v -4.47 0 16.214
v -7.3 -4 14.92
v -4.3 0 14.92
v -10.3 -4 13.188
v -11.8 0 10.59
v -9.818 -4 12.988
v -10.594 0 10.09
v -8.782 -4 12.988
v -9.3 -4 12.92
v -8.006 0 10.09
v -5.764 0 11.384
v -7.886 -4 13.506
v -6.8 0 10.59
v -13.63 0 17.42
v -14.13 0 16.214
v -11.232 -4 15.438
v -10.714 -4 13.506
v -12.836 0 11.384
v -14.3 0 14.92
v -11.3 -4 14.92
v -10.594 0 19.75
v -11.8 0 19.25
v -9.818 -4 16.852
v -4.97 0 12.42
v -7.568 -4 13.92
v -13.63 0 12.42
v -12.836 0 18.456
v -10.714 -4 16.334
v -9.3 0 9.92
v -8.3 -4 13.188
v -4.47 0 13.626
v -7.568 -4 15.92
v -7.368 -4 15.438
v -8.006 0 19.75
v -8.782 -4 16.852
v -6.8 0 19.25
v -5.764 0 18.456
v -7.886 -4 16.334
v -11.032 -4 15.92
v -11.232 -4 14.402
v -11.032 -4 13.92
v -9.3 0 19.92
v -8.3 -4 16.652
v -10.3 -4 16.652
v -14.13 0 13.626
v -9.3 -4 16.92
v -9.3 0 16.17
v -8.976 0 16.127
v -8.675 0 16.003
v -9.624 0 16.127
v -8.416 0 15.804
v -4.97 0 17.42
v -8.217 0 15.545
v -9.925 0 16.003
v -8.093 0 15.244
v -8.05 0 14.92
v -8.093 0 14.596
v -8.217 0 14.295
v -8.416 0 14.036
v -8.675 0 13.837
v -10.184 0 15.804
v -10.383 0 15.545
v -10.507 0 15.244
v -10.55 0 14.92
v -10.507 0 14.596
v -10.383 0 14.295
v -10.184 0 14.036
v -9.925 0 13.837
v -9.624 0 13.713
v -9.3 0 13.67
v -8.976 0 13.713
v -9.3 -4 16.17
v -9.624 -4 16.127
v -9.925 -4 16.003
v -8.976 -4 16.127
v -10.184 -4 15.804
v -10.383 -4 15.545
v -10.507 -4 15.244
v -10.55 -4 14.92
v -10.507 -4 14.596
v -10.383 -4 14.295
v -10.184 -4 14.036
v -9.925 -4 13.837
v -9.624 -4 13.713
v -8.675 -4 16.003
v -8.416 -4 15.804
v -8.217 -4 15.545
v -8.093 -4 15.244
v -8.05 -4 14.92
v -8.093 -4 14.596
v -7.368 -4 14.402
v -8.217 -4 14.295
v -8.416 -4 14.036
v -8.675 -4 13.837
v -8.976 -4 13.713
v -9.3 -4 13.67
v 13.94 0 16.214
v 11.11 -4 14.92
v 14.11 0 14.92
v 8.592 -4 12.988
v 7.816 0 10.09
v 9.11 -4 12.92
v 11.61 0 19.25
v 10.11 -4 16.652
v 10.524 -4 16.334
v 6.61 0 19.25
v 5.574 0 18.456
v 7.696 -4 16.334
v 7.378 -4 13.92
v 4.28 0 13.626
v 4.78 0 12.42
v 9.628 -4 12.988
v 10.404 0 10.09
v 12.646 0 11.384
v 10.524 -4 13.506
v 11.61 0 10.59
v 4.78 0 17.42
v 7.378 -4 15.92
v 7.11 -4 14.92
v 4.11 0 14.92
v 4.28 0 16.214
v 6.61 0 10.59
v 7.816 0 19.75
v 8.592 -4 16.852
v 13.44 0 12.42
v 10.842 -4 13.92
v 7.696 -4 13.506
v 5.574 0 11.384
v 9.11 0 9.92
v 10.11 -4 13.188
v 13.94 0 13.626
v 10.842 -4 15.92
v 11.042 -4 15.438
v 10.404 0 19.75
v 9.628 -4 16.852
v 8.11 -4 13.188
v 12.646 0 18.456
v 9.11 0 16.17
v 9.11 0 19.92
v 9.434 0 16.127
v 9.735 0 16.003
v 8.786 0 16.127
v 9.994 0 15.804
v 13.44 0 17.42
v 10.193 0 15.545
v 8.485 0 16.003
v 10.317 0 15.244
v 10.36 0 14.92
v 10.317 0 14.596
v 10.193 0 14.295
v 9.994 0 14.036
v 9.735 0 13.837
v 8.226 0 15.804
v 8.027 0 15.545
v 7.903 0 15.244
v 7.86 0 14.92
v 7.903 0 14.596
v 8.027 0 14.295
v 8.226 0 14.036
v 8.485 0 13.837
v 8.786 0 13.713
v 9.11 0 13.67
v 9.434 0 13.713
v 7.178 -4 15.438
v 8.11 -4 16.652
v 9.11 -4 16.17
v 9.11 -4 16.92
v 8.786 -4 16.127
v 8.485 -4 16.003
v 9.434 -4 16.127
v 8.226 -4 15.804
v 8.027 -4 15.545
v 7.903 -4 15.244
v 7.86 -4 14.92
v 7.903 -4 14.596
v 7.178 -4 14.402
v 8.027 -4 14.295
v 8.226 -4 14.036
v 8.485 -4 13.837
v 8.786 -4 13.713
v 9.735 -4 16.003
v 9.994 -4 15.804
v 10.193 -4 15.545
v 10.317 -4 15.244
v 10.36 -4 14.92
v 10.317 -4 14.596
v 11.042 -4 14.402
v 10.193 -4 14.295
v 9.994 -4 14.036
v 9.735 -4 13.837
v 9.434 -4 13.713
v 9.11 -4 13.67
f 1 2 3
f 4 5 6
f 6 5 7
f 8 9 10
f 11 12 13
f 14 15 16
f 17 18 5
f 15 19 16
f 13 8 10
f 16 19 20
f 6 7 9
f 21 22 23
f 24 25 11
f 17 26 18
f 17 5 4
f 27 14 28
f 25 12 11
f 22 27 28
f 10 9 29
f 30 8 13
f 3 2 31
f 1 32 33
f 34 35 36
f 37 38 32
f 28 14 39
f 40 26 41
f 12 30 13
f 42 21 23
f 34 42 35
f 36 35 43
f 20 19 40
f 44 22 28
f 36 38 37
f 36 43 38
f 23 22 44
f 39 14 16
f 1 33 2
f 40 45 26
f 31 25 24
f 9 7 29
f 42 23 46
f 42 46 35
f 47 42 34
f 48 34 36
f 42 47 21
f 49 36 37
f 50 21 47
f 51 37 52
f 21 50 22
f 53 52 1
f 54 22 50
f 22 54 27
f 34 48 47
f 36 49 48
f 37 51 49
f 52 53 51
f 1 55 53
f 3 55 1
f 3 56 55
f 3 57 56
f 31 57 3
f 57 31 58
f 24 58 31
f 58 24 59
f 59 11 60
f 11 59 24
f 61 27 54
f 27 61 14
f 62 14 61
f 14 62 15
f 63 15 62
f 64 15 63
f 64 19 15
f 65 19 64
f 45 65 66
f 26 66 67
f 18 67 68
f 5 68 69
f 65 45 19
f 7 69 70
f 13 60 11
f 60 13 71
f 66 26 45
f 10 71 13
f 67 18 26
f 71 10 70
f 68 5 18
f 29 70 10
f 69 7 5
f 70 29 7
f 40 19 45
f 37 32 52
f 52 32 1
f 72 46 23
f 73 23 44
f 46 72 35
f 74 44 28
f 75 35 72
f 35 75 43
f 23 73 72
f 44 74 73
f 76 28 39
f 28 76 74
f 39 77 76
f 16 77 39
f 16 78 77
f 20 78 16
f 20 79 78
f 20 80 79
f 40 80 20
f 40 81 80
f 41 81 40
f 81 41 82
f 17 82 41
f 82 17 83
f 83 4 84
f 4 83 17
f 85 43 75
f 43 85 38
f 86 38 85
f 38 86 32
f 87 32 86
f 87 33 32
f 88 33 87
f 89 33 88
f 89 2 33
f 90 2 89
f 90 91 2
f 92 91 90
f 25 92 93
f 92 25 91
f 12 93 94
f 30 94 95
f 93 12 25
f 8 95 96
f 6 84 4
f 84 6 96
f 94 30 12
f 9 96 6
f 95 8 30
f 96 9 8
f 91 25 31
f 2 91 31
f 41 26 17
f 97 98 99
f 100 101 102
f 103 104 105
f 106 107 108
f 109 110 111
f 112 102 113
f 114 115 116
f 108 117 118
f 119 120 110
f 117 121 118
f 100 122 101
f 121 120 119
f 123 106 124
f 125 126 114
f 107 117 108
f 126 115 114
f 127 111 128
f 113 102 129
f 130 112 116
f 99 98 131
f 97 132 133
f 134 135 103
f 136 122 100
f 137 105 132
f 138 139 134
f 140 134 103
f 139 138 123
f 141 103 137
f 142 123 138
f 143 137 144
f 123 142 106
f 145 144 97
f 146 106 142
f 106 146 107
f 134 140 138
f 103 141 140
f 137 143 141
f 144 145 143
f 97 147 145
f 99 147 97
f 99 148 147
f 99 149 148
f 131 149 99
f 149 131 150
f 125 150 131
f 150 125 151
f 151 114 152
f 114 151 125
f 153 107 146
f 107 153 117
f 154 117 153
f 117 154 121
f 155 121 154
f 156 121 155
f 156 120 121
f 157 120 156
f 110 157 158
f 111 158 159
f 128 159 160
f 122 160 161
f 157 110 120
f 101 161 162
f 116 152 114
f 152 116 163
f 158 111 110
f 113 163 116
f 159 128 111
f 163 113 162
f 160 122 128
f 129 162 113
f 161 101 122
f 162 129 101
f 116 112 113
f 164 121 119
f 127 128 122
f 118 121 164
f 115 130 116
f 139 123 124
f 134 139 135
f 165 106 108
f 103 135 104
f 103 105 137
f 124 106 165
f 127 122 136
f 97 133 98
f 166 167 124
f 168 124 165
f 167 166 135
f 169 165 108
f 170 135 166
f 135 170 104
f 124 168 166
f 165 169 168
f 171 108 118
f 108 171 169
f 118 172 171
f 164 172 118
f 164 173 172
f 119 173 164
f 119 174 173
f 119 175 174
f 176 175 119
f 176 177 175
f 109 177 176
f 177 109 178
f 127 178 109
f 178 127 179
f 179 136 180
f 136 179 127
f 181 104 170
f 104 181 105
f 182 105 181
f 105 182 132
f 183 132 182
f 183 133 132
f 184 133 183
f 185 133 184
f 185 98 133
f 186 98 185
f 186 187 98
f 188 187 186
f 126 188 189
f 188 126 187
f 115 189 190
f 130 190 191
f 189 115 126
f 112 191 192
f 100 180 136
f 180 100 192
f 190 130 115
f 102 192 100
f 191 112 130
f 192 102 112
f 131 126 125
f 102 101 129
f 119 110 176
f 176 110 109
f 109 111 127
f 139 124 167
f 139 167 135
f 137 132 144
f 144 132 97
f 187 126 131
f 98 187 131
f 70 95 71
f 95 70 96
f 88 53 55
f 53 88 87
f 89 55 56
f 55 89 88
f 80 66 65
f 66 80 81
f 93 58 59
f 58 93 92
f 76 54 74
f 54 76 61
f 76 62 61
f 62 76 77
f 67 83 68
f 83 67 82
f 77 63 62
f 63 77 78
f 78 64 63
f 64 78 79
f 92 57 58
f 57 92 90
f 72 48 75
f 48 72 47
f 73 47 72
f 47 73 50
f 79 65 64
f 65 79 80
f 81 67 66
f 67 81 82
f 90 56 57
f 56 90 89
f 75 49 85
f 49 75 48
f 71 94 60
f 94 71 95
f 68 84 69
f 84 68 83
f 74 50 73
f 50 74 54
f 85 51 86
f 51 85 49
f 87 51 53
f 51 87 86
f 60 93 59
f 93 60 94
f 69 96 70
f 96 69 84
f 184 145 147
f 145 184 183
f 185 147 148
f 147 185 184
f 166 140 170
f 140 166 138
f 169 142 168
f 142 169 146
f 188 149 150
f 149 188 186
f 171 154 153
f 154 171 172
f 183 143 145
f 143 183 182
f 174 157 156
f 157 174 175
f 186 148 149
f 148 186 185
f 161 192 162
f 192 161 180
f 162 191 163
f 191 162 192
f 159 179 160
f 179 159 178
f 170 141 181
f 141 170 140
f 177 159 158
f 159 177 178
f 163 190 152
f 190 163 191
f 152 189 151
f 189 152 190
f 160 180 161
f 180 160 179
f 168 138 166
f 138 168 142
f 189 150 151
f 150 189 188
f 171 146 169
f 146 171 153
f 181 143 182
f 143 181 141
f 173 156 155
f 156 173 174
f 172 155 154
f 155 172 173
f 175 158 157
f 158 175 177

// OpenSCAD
//
// Copyright (C) 2015, Jason S. McMullan <jason.mcmullan@gmail.com>
// All right reserved.
//
// Licensed under the MIT License:
//
// Permission is hereby granted, free of charge, to any person obtaining
// a copy of this software and associated documentation files (the "Software"),
// to deal in the Software without restriction, including without limitation
// the rights to use, copy, modify, merge, publish, distribute, sublicense,
// and/or sell copies of the Software, and to permit persons to whom the
// Software is furnished to do so, subject to the following conditions:
//
// The above copyright notice and this permission notice shall be included
// in all copies or substantial portions of the Software.
//
// THE SOFTWARE IS PROVIDED "AS IS", WITHOUT WARRANTY OF ANY KIND, EXPRESS OR
// IMPLIED, INCLUDING BUT NOT LIMITED TO THE WARRANTIES OF MERCHANTABILITY,
// FITNESS FOR A PARTICULAR PURPOSE AND NONINFRINGEMENT. IN NO EVENT SHALL THE
// AUTHORS OR COPYRIGHT HOLDERS BE LIABLE FOR ANY CLAIM, DAMAGES OR OTHER
// LIABILITY, WHETHER IN AN ACTION OF CONTRACT, TORT OR OTHERWISE, ARISING
// FROM, OUT OF OR IN CONNECTION WITH THE SOFTWARE OR THE USE OR OTHER
// DEALINGS IN THE SOFTWARE.
//
// All units are in mm

module mini_height_sensor(width=1)
{
   scale([1, width, 1]) difference() {
        cube([24.0, 1, 17.62]);
        translate([0, -0.1, 0]) {
            translate([2.7,  0, 14.92])
                rotate([-90, 0, 0]) cylinder(d=2.8, h=1.2, $fn=24);
            translate([21.11, 0, 14.92])
                rotate([-90, 0, 0]) cylinder(d=2.8, h=1.2, $fn=24);
        }
    }
}

module mini_height_sensor_drill(post=4)
{
    translate([-24/2, 0, 0]) {
        translate([2.7, 0.1, 14.92]) rotate([90, 0, 0]) cylinder(d=2.5, h=post+0.2, $fn=24);
        translate([21.11, 0.1, 14.92]) rotate([90, 0, 0]) cylinder(d=2.5, h=post+0.2, $fn=24);
    }
    rotate([90, 0, 0]) cylinder(d=17, h=post+0.2, $fn=24);
}

// Origin is bottom middle of the sensor itself
module mini_height_sensor_mount(post=4, base=10)
{
    difference() {
        translate([-24/2, 0, 0]) {
            union() {
                translate([2.7, 0, 14.92]) rotate([90, 0, 0]) {
                    cylinder(d1=base, d2=4, h=post, $fn=24);
                }
                translate([21.11, 0, 14.92]) rotate([90, 0, 0]) {
                    cylinder(d1=base, d2=4, h=post, $fn=24);
                }
            }
        }
        mini_height_sensor_drill(post=post);
    }

    translate([-24/2, 0, 0]) 
        % translate([0, -(post+1), 0])
            mini_height_sensor();
}

# mini_height_sensor_mount();
// vim: set shiftwidth=4 expandtab: //
